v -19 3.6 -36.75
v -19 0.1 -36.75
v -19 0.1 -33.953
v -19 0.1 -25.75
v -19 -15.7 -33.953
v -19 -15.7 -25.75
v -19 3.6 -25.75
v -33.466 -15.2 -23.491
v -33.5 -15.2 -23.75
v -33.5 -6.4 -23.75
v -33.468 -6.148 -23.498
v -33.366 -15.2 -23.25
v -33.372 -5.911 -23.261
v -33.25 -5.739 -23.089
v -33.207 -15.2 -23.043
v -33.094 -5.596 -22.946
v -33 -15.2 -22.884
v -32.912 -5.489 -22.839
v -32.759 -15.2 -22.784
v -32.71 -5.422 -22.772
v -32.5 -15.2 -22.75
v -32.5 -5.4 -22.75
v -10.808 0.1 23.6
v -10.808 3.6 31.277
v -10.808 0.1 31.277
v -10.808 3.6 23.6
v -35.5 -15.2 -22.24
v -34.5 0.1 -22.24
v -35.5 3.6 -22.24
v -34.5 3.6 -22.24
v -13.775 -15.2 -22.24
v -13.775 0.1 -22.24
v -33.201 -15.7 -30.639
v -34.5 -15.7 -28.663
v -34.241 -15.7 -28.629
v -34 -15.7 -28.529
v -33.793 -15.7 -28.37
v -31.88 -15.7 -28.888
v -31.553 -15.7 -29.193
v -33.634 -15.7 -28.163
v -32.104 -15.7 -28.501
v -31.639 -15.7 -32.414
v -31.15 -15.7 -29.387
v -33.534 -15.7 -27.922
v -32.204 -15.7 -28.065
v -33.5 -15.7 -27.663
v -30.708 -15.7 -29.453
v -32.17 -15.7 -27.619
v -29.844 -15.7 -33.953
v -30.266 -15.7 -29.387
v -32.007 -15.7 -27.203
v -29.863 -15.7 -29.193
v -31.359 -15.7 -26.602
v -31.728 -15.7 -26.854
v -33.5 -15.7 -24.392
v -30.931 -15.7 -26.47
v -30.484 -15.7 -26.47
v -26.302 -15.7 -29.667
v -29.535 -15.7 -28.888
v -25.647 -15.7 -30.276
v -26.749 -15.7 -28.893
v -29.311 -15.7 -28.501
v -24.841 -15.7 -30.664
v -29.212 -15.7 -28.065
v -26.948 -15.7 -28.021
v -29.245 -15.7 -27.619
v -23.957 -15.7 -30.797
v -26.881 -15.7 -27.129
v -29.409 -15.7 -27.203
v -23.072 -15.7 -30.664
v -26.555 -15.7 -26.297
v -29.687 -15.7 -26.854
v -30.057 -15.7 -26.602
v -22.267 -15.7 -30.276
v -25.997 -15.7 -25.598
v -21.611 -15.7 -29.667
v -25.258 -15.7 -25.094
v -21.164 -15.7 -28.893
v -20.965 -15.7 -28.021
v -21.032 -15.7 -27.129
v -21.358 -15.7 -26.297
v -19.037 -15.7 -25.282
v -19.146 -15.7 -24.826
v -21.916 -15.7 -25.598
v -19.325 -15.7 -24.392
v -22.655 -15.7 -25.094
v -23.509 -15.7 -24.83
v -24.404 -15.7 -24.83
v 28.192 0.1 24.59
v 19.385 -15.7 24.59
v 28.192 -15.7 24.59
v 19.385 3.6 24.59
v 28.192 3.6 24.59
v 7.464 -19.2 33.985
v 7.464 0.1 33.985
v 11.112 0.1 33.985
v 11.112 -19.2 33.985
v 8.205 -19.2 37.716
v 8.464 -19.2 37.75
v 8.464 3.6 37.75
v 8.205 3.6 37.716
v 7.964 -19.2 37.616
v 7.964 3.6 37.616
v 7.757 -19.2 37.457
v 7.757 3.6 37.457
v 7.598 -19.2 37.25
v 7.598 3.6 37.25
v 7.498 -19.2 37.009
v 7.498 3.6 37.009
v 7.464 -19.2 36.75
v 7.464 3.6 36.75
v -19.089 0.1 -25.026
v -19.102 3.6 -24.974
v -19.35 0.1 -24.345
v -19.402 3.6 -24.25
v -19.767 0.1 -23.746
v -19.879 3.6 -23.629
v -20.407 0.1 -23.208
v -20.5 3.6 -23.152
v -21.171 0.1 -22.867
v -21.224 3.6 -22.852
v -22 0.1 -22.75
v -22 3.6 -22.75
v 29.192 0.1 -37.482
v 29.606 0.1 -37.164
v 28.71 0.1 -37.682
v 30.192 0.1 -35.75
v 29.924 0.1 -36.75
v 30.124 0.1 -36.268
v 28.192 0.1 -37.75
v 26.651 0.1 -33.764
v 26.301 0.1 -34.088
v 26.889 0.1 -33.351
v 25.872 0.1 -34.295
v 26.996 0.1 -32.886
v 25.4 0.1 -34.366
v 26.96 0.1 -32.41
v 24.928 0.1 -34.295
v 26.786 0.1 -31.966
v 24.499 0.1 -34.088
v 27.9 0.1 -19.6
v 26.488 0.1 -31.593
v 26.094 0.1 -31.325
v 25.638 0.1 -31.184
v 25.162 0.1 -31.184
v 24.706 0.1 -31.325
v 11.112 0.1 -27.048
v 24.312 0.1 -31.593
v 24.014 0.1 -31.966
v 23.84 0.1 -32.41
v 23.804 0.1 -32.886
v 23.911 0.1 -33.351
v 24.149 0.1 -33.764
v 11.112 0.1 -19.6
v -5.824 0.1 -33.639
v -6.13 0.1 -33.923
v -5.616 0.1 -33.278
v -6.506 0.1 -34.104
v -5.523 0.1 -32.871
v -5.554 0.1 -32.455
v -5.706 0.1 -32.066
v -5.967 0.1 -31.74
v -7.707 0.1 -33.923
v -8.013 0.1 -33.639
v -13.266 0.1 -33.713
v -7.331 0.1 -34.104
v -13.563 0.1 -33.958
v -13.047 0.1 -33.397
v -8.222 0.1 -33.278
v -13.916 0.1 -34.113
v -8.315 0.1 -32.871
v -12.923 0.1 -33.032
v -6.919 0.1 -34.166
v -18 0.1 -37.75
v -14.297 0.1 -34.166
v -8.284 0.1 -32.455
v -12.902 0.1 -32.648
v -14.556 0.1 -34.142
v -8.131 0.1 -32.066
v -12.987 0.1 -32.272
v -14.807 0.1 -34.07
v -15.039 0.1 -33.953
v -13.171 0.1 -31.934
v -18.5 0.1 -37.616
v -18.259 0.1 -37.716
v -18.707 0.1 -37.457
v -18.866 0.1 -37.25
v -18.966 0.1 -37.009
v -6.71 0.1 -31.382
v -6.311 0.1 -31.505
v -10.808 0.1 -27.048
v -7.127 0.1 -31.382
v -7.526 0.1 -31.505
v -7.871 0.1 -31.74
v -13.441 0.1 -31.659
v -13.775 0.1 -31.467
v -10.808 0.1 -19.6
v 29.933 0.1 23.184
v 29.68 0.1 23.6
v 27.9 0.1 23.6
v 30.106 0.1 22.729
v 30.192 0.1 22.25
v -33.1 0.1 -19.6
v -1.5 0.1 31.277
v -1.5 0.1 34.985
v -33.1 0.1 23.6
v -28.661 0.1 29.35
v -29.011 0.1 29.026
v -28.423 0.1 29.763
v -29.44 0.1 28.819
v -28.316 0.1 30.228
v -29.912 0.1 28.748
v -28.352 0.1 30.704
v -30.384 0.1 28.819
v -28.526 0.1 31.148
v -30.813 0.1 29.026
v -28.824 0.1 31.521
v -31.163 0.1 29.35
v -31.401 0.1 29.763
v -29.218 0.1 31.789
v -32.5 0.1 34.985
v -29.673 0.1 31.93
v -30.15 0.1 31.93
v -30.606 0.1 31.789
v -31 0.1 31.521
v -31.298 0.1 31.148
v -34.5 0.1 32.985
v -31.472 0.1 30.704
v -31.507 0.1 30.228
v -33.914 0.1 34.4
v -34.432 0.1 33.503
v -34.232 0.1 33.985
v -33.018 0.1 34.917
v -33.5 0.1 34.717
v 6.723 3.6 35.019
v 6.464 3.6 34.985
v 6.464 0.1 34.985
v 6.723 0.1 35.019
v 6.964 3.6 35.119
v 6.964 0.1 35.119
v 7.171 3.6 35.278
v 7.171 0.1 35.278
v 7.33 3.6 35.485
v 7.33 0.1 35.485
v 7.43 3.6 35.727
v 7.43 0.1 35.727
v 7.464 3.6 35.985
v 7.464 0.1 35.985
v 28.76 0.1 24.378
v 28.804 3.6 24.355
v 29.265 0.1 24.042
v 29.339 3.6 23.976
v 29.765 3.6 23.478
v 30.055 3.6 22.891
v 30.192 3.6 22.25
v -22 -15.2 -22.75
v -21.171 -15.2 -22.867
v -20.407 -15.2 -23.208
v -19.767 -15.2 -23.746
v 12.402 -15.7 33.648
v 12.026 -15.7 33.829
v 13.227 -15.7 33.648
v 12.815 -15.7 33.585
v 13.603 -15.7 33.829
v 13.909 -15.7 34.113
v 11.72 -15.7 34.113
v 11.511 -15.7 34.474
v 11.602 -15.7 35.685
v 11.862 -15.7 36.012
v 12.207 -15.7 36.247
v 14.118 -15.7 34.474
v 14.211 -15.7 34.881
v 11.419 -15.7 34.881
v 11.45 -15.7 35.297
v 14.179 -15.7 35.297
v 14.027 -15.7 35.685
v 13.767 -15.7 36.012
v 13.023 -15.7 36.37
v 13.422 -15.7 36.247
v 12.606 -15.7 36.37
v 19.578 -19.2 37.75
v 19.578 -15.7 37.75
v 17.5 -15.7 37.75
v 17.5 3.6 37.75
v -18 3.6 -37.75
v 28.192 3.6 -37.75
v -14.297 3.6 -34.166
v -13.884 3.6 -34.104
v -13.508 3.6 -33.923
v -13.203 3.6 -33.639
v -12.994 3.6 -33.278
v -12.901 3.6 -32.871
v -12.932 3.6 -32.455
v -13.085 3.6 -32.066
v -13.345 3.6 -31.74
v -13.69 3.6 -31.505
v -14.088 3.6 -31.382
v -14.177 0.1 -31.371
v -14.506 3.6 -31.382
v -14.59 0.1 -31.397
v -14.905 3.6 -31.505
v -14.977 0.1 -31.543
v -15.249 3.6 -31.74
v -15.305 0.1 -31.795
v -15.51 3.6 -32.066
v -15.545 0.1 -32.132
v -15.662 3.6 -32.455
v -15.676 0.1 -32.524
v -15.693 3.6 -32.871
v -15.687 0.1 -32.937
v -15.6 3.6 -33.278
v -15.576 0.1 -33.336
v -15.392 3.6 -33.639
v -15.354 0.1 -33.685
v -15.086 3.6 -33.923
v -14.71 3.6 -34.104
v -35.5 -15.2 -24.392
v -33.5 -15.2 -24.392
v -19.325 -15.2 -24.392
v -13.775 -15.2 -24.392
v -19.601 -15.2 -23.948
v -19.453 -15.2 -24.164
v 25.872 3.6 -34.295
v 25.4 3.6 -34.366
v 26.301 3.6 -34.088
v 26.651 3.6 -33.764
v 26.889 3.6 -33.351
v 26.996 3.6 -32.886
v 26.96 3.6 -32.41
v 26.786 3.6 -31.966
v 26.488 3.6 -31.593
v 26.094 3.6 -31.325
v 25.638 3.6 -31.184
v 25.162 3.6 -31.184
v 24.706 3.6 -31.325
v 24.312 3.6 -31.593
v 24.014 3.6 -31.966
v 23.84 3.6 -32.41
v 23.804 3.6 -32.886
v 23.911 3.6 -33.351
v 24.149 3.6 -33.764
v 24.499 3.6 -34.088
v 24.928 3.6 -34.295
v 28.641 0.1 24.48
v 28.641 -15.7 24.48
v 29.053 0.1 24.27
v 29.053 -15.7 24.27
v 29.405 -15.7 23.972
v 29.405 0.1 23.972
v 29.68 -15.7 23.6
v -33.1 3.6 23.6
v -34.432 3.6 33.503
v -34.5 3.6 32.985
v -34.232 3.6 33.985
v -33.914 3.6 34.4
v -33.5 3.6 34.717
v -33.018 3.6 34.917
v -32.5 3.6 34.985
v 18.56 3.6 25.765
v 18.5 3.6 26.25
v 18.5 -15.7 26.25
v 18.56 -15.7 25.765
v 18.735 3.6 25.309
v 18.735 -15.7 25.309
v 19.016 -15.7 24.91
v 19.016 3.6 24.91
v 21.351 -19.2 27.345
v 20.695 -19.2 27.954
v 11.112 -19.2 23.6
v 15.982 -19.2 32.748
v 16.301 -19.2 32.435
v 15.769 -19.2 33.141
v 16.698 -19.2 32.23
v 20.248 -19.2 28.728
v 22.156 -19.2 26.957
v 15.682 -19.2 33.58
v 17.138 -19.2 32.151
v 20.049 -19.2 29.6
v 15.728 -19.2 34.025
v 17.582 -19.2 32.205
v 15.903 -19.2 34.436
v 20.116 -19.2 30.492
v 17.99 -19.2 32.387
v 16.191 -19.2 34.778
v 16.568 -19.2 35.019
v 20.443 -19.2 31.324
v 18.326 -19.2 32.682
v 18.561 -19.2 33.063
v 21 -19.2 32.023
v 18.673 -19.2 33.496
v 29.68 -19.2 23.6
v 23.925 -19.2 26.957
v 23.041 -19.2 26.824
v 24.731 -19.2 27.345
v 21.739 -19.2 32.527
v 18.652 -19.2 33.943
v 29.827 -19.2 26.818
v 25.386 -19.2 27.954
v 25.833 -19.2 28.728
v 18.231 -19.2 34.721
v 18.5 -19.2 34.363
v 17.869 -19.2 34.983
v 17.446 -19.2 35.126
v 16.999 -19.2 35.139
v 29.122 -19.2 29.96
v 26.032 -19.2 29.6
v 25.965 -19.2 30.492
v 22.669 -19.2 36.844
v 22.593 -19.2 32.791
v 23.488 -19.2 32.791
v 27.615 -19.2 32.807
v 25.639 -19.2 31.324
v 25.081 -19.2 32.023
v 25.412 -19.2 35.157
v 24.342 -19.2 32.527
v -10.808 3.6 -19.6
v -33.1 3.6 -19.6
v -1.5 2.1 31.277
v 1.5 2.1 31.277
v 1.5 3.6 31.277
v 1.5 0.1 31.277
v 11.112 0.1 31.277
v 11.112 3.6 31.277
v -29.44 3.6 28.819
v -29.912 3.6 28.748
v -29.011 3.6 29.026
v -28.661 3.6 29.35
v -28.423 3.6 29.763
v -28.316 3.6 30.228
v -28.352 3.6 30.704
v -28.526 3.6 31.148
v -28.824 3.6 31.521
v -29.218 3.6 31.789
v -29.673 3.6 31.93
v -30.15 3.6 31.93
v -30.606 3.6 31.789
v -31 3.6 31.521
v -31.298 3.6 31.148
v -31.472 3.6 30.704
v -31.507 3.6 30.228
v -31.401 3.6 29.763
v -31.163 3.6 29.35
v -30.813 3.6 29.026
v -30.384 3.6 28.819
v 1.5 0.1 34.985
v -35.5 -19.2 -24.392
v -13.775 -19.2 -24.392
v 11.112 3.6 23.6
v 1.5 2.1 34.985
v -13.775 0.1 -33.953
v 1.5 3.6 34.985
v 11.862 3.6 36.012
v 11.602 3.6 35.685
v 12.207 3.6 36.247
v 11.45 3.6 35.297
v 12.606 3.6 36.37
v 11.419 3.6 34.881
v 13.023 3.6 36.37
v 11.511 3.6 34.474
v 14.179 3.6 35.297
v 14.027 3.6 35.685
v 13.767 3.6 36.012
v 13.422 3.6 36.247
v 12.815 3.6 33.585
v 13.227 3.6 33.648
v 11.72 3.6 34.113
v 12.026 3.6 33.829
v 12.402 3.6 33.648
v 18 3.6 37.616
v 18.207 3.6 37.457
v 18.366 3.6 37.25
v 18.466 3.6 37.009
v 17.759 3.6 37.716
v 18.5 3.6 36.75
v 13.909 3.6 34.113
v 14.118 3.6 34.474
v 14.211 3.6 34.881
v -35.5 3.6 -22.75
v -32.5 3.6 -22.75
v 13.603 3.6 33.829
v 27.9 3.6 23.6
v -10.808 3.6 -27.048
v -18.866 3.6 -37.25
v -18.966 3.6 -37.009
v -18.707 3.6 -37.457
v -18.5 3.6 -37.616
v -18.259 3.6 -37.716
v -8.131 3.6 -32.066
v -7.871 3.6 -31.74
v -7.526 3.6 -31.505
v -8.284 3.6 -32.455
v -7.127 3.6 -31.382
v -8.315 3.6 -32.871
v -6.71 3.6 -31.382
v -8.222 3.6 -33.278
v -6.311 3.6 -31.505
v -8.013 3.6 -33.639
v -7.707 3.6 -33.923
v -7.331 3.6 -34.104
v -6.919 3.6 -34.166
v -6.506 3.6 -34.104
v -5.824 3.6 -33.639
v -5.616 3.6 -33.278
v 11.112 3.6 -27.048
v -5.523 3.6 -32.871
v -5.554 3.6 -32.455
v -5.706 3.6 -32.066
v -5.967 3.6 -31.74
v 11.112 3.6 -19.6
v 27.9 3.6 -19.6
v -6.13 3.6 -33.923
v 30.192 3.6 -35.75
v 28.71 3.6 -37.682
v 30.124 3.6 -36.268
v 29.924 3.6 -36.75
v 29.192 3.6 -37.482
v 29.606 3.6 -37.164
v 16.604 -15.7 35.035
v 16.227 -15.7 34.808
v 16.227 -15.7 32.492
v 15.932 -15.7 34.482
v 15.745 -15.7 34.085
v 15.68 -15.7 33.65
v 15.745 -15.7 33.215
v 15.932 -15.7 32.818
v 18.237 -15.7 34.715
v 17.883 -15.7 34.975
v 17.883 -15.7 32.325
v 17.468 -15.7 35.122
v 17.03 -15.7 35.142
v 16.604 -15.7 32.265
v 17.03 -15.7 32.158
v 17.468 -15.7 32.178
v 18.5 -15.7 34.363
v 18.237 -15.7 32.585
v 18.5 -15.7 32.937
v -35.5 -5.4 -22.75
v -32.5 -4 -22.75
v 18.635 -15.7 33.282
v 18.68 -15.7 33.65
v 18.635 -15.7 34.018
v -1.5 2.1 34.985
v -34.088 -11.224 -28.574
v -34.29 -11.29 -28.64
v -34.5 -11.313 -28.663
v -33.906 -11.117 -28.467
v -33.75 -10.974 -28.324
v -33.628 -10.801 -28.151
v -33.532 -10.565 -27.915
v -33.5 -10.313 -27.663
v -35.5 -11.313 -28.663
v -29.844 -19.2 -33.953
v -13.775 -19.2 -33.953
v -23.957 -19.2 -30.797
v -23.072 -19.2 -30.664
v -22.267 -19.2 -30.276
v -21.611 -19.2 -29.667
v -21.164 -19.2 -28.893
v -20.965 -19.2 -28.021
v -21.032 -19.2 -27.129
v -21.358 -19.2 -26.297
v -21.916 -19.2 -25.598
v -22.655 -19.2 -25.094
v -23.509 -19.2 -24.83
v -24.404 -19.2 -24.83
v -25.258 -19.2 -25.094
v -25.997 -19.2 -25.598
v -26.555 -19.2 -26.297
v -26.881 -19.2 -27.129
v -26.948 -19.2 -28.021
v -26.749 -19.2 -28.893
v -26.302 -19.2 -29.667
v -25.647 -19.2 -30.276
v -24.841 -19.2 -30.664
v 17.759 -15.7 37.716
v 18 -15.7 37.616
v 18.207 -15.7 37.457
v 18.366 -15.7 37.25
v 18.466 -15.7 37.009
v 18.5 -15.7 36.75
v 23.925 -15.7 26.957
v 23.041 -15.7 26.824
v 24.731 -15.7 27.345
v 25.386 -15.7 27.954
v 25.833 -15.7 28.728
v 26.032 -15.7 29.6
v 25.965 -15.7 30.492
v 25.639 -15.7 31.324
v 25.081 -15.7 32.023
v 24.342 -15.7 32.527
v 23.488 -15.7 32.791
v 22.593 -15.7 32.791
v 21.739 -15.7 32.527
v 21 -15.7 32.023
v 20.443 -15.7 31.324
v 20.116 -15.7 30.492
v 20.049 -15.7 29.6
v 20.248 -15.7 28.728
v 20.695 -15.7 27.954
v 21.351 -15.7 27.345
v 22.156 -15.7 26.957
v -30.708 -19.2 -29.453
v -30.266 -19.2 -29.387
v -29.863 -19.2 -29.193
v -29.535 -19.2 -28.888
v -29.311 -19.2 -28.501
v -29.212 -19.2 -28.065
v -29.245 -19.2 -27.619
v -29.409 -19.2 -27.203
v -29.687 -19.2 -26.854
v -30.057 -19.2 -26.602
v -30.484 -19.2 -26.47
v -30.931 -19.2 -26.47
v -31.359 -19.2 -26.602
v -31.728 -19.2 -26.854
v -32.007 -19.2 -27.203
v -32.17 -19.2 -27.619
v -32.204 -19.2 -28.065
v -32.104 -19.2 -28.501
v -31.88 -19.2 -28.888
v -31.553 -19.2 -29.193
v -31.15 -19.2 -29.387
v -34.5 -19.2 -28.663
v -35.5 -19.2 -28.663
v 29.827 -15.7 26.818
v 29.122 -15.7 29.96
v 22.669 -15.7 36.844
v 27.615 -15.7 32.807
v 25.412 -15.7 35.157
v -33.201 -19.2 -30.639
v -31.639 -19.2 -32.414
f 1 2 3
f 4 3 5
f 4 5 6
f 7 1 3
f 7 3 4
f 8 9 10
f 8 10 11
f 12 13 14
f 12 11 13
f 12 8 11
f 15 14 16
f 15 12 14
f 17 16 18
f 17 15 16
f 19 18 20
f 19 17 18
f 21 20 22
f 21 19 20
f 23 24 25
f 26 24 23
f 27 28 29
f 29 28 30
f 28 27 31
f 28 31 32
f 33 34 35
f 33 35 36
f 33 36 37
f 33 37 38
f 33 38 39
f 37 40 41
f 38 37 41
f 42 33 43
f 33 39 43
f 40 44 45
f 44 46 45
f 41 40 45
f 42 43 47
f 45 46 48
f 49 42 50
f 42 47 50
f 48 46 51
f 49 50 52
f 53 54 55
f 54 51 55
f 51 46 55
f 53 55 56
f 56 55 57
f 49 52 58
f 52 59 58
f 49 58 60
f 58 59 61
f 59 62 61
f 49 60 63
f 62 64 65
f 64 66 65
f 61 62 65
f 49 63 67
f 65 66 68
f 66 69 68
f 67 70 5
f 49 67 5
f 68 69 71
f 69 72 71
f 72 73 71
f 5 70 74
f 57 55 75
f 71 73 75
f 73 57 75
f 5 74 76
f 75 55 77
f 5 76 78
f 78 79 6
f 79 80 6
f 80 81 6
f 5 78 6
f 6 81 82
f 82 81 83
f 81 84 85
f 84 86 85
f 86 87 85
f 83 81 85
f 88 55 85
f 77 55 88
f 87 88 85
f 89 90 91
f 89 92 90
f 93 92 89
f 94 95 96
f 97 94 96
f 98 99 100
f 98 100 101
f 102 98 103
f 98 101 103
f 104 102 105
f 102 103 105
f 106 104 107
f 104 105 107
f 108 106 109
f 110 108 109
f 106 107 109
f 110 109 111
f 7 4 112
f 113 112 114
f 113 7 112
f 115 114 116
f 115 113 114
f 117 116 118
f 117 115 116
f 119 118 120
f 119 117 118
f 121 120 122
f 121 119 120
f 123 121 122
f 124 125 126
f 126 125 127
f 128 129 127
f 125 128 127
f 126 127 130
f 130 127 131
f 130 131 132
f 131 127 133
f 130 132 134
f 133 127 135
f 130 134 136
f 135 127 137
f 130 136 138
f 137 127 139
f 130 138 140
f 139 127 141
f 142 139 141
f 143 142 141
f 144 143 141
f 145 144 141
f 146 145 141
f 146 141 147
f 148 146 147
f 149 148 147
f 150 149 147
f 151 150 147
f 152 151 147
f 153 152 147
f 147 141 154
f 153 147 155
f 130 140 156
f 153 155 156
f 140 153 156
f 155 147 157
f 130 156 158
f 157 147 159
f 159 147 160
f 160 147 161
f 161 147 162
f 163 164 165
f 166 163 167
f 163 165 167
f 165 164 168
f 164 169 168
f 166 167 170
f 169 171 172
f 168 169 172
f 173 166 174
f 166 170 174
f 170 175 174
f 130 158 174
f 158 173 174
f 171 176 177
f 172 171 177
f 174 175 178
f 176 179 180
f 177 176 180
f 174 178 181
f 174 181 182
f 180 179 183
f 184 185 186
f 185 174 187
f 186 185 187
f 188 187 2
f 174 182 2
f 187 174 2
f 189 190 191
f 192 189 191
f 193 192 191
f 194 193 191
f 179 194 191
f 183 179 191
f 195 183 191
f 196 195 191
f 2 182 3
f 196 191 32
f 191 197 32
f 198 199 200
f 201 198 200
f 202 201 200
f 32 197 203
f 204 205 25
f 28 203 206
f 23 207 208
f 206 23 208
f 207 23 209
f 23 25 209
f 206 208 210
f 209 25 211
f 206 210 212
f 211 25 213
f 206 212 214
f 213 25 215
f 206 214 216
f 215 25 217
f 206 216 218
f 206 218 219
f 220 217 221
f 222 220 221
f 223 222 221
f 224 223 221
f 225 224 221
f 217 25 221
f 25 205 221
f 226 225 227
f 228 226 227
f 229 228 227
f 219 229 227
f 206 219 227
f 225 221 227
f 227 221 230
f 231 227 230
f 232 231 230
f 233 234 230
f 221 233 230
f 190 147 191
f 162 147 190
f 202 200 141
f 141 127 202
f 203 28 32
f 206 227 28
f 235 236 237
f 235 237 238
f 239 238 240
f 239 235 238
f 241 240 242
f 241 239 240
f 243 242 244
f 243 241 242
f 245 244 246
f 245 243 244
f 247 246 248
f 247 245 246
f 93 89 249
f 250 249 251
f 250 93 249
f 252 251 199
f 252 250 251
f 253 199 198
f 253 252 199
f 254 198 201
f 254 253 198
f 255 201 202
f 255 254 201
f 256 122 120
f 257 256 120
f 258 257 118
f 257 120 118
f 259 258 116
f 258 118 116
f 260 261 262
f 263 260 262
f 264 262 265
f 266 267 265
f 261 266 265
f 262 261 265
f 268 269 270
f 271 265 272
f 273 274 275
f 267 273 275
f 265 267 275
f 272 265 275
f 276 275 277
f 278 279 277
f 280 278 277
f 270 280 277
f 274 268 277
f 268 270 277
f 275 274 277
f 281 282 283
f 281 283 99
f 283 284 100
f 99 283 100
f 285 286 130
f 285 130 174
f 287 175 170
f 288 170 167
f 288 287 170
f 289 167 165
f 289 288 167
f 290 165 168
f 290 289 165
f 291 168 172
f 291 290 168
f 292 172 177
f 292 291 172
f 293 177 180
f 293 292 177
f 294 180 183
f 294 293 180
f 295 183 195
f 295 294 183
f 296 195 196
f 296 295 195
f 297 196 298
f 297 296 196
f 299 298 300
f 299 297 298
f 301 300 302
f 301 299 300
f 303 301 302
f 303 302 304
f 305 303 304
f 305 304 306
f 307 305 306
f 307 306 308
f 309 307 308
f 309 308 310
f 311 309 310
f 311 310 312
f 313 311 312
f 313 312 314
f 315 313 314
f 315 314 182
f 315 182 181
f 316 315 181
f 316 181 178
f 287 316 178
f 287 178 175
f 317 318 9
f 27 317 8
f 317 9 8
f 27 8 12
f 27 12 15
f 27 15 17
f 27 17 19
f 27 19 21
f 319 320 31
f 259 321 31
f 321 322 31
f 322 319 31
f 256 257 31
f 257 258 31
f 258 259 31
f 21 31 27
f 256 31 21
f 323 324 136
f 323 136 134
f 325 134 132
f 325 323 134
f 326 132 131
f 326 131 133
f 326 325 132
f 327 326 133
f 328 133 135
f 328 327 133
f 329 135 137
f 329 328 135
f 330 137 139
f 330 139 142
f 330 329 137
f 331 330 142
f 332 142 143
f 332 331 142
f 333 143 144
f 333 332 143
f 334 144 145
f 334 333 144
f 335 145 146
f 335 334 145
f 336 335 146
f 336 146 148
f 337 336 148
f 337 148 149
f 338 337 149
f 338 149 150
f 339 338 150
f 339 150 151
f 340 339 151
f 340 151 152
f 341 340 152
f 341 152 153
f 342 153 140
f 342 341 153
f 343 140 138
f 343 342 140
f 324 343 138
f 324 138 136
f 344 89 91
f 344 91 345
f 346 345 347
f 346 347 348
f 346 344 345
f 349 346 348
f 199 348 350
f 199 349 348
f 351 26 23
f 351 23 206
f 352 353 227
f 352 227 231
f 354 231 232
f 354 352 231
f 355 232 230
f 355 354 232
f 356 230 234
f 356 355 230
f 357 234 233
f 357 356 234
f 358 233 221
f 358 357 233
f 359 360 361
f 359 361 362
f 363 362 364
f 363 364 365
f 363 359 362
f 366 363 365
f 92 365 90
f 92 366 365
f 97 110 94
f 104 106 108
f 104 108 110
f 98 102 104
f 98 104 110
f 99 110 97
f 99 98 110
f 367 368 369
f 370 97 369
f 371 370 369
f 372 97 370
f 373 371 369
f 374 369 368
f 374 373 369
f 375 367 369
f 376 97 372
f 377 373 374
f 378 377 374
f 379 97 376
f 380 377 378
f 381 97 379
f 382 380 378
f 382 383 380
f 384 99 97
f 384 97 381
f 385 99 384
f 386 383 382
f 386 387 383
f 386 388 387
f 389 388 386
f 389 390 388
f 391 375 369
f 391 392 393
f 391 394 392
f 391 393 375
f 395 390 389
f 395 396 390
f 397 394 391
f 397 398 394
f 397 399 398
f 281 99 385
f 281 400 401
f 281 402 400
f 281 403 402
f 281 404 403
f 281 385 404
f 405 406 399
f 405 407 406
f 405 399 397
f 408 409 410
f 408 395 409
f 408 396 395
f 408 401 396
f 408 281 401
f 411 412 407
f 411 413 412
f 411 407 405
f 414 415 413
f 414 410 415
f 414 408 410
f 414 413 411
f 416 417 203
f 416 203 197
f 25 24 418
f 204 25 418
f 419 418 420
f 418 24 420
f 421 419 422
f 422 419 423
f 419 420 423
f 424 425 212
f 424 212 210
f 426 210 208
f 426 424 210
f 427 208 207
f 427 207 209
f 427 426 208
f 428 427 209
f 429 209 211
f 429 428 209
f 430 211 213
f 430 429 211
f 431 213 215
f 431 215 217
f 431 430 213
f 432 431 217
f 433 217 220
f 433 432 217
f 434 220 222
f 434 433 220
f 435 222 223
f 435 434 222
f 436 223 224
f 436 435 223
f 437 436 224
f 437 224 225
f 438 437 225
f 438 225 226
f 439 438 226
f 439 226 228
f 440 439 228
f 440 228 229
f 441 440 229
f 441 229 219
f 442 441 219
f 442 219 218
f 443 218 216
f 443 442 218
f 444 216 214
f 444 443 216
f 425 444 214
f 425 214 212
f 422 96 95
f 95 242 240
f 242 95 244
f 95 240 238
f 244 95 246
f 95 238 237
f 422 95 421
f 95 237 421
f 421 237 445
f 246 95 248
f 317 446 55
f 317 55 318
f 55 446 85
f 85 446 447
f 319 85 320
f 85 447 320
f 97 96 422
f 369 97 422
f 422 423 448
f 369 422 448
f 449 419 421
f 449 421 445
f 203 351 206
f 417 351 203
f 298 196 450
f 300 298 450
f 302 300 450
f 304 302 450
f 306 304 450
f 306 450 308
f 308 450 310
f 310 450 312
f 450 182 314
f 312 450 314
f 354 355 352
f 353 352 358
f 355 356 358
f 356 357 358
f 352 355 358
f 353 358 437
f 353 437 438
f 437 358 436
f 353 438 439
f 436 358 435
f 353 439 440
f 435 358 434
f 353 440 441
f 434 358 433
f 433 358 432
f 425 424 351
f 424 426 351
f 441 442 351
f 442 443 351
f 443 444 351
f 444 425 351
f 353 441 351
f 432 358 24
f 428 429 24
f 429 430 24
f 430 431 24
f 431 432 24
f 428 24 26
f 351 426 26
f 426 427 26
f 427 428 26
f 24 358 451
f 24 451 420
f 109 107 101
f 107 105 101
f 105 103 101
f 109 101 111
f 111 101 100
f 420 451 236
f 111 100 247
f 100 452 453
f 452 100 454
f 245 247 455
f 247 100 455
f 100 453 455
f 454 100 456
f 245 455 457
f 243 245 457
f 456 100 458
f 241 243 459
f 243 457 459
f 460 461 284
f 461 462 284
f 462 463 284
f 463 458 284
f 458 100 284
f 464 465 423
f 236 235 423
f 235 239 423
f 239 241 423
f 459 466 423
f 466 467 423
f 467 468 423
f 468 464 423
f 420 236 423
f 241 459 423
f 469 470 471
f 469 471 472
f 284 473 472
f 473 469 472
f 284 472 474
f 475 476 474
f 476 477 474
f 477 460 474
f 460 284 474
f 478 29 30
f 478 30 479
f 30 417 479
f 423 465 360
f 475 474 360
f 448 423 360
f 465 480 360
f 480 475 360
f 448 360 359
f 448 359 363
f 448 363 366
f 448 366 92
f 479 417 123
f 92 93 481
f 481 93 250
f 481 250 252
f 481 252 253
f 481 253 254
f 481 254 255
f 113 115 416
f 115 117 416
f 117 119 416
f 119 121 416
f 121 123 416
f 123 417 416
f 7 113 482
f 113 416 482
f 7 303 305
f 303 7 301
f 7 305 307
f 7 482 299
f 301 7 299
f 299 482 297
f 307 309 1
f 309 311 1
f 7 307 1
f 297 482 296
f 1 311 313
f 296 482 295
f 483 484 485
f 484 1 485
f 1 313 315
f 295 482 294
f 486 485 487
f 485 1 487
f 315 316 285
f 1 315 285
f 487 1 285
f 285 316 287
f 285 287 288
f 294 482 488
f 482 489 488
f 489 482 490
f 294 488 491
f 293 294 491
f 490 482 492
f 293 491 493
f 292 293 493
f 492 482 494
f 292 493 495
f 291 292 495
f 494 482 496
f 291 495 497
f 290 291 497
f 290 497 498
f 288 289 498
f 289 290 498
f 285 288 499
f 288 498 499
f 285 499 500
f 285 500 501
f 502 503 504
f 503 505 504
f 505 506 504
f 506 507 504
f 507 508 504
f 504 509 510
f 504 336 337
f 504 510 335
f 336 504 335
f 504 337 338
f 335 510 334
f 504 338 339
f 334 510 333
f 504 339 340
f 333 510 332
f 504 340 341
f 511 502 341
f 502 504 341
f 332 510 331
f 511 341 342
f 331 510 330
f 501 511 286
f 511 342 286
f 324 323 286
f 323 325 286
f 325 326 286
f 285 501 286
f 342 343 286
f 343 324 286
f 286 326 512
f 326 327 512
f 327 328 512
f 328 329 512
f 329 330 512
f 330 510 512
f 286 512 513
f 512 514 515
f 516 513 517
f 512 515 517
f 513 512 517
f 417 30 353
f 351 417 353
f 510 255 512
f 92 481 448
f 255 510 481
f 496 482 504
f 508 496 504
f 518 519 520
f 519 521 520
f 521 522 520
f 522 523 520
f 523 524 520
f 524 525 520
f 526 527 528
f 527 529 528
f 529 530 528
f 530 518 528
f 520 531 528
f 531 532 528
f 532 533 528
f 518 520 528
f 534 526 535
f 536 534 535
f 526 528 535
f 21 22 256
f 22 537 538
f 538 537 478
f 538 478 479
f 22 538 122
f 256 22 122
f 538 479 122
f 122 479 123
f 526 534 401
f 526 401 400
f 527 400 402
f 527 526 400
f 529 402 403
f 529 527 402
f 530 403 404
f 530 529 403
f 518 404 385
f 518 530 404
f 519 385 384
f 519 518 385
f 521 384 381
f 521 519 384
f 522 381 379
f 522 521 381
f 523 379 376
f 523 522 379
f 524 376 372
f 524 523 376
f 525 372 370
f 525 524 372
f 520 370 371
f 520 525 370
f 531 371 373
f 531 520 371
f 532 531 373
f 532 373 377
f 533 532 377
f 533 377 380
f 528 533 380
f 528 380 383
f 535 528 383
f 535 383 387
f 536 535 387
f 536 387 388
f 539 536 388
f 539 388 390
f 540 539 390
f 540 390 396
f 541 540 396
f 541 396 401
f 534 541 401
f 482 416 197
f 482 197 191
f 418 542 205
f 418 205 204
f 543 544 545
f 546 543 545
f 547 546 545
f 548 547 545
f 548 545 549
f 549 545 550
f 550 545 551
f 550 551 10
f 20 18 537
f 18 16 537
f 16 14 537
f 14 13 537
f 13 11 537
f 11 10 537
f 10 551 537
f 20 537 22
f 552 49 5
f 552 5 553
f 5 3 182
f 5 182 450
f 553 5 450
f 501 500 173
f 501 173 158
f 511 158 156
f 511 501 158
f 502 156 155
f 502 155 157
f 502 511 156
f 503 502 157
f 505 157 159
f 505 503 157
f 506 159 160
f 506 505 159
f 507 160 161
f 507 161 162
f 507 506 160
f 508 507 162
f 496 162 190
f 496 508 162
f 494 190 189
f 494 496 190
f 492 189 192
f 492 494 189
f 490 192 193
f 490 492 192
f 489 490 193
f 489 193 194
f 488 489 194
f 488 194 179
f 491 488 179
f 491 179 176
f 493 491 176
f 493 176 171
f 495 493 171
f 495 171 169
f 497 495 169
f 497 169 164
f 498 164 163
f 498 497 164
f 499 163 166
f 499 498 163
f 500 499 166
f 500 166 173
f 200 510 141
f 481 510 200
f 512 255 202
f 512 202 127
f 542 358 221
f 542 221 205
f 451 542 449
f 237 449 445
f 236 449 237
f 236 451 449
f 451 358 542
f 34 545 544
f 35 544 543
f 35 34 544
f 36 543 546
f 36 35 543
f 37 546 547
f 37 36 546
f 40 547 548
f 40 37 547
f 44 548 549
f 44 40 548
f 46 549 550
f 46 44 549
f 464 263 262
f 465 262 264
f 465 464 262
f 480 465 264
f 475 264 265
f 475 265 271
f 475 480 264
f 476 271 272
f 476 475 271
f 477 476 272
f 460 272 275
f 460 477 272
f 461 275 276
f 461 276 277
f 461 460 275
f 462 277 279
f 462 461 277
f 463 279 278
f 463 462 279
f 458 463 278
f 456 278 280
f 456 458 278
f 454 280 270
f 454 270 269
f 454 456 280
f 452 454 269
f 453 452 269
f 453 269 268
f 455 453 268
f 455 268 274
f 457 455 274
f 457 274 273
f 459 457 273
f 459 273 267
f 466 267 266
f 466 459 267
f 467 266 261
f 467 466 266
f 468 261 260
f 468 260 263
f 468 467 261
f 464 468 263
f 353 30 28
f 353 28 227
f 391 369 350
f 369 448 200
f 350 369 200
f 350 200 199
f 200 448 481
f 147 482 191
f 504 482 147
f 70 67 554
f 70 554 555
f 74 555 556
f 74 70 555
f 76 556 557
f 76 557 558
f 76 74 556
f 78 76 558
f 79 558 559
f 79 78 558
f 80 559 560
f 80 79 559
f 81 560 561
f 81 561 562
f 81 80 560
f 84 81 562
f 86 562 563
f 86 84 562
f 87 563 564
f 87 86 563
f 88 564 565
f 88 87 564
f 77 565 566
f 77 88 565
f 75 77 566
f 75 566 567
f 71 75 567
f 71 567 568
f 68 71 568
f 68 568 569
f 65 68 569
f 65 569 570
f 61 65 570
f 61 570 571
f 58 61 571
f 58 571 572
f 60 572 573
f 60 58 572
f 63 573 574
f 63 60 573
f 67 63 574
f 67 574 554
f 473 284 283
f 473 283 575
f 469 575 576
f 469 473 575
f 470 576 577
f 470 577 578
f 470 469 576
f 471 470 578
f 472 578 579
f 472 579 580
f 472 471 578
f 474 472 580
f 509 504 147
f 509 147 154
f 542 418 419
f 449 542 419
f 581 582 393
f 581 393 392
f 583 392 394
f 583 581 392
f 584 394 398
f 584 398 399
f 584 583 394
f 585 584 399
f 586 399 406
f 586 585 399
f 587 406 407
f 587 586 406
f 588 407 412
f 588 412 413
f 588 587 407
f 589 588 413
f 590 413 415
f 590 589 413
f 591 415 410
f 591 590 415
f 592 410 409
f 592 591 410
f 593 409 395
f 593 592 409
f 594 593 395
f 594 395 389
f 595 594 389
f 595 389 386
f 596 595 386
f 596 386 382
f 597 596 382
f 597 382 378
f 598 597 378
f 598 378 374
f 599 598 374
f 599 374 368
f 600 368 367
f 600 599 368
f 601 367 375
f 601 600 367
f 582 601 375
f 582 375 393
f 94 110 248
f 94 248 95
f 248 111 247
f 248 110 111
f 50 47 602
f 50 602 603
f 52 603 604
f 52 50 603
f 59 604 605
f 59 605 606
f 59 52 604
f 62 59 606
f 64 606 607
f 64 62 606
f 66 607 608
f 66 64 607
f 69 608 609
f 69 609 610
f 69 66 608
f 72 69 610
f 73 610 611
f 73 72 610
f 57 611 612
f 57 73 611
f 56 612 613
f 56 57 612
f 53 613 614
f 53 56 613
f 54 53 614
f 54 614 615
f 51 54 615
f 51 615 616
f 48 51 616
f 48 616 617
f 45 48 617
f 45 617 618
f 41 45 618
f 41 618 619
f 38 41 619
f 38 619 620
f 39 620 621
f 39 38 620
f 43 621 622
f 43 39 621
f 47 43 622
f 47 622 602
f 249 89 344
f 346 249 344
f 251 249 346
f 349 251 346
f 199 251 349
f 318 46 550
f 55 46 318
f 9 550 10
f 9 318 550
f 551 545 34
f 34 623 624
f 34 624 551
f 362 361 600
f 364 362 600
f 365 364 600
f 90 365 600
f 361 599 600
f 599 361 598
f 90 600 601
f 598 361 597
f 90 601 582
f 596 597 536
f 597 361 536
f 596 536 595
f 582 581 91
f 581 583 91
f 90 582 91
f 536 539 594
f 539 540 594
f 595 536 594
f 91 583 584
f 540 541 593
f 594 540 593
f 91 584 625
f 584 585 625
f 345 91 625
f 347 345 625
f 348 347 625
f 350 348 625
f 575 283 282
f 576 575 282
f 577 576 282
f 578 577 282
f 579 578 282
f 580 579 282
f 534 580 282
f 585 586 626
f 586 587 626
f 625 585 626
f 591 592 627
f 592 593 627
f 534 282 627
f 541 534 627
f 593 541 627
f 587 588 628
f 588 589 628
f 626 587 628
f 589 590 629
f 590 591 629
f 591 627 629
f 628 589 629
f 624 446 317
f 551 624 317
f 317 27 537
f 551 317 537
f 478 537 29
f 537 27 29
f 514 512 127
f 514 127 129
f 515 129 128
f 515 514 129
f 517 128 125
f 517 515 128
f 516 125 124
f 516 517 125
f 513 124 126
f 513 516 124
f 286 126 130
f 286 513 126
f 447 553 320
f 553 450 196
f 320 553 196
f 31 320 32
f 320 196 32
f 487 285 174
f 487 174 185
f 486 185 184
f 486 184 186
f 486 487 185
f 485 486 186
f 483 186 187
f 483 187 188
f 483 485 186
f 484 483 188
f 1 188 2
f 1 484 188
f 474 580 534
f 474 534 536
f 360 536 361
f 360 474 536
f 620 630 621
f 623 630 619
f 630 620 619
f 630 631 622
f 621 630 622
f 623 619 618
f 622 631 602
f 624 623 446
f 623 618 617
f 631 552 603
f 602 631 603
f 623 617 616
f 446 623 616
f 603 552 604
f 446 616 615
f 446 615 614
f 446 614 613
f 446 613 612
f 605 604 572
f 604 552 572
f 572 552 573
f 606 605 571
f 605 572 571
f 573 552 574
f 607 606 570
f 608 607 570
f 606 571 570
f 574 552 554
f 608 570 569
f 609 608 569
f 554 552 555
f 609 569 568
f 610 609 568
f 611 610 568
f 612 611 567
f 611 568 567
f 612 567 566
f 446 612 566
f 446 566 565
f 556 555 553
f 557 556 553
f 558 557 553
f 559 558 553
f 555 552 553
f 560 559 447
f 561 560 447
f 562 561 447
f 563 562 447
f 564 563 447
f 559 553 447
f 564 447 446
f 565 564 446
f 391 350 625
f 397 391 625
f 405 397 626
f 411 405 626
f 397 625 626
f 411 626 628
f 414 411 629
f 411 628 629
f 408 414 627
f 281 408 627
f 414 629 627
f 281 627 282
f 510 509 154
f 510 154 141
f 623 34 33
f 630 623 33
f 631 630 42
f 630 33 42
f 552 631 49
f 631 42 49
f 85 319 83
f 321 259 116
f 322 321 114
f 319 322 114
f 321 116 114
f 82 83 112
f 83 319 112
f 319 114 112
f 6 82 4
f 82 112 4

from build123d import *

# Parameters (mm, degrees)
SKETCH2_R           = 1.4
SKETCH2_R_2         = 1.6
BOSS_EXTRUDE1_DEPTH = 3.5
SKETCH3_R           = 1.4
BOSS_EXTRUDE2_DEPTH = 15.8
SKETCH4_R           = 3
SKETCH4_R_2         = 1.5
BOSS_EXTRUDE3_DEPTH = 3.5
SKETCH5_W           = 3
SKETCH5_H           = 3.708496363
BOSS_EXTRUDE4_DEPTH = 1.5
SKETCH7_W           = 35.498397003
SKETCH7_H           = 12.144188448
CUT_EXTRUDE2_DEPTH  = 4
BOSS_EXTRUDE5_DEPTH = 1
SKETCH6_W           = 15.172785082
SKETCH6_H           = 14.006435155
CUT_EXTRUDE3_DEPTH  = 15
CHAMFER1_START      = -11.4
CHAMFER1_DEPTH      = 0.087265638
CHAMFER1_START_2    = -35.5
CHAMFER1_2_DEPTH    = 3
CHAMFER1_START_3    = -11.312734362
CHAMFER1_3_DEPTH    = 7.312734362


with BuildPart() as part:
    # Sketch2 → Boss-Extrude1 (new body)
    with BuildSketch(Plane.XZ.offset(-3.6)):
        with BuildLine():
            Line((11.111566046, -27.048023457), (11.111566046, -19.6))
            Line((11.111566046, -19.6), (27.9, -19.6))
            Line((27.9, -19.6), (27.9, 23.6))
            Line((27.9, 23.6), (11.111563156, 23.6))
            Line((11.111563156, 23.6), (11.111563156, 31.276925258))
            Line((11.111563156, 31.276925258), (1.5, 31.276925258))
            Line((1.5, 31.276925258), (1.5, 34.985421621))
            Line((1.5, 34.985421621), (6.463917188, 34.985421621))
            ThreePointArc((6.463917188, 34.985421621), (7.171023969, 35.278314839), (7.463917188, 35.985421621))
            Line((7.463917188, 35.985421621), (7.463917188, 36.75))
            ThreePointArc((7.463917188, 36.75), (7.756810407, 37.457106781), (8.463917188, 37.75))
            Line((8.463917188, 37.75), (17.5, 37.75))
            ThreePointArc((17.5, 37.75), (18.207106781, 37.457106781), (18.5, 36.75))
            Line((18.5, 36.75), (18.5, 26.25))
            ThreePointArc((18.5, 26.25), (18.73500033, 25.309374588), (19.384776166, 24.589796458))
            Line((19.384776166, 24.589796458), (28.192260407, 24.589796458))
            ThreePointArc((28.192260407, 24.589796458), (29.567455824, 23.740606822), (30.192257213, 22.25))
            Line((30.192257213, 22.25), (30.192257213, -35.750098385))
            ThreePointArc((30.192257213, -35.750098385), (29.606435992, -37.164248347), (28.192257213, -37.75))
            Line((28.192257213, -37.75), (-18, -37.75))
            ThreePointArc((-18, -37.75), (-18.707106781, -37.457106781), (-19, -36.75))
            Line((-19, -36.75), (-19, -25.75))
            ThreePointArc((-19, -25.75), (-19.878679656, -23.628679656), (-22, -22.75))
            Line((-22, -22.75), (-32.5, -22.75))
            ThreePointArc((-32.5, -22.75), (-33.207106781, -23.042893219), (-33.5, -23.75))
            Line((-33.5, -23.75), (-33.5, -27.662734362))
            ThreePointArc((-33.5, -27.662734362), (-33.792893219, -28.369841143), (-34.5, -28.662734362))
            Line((-34.5, -28.662734362), (-34.5, 32.985421621))
            ThreePointArc((-34.5, 32.985421621), (-33.914213562, 34.399635183), (-32.5, 34.985421621))
            Line((-32.5, 34.985421621), (-1.5, 34.985421621))
            Line((-1.5, 34.985421621), (-1.5, 31.276925258))
            Line((-1.5, 31.276925258), (-10.808436895, 31.276925258))
            Line((-10.808436895, 31.276925258), (-10.808436895, 23.6))
            Line((-10.808436895, 23.6), (-33.1, 23.6))
            Line((-33.1, 23.6), (-33.1, -19.6))
            Line((-33.1, -19.6), (-10.808436895, -19.6))
            Line((-10.808436895, -19.6), (-10.808436895, -27.048023457))
            Line((-10.808436895, -27.048023457), (11.111566046, -27.048023457))
        make_face()
        with Locations(Location((-6.918752516, -32.76626587, 0), (0, 0, 270))):
            Circle(SKETCH2_R, mode=Mode.SUBTRACT)
        with Locations(Location((25.4, -32.76626587, 0), (0, 0, 270))):
            Circle(SKETCH2_R_2, mode=Mode.SUBTRACT)
        with Locations(Location((-14.297096298, -32.76626587, 0), (0, 0, 270))):
            Circle(SKETCH2_R, mode=Mode.SUBTRACT)
        with Locations(Location((-29.911917882, 30.347920192, 0), (0, 0, 270))):
            Circle(SKETCH2_R_2, mode=Mode.SUBTRACT)
        with Locations(Location((12.814585658, 34.985421621, 0), (0, 0, 270))):
            Circle(SKETCH2_R, mode=Mode.SUBTRACT)
    extrude(amount=BOSS_EXTRUDE1_DEPTH)

    # Sketch3 → Boss-Extrude2 (add)
    # profile 1 of 2: a face of its own
    with BuildSketch(Plane(origin=(0, 0.1, 0), x_dir=(-1, 0, 0), z_dir=(0, -1, 0))):
        with BuildLine():
            Line((-7.463917188, -33.985421621), (-7.463917188, -36.75))
            ThreePointArc((-7.463917188, -36.75), (-7.756810407, -37.457106781), (-8.463917188, -37.75))
            Line((-8.463917188, -37.75), (-17.5, -37.75))
            ThreePointArc((-17.5, -37.75), (-18.207106781, -37.457106781), (-18.5, -36.75))
            Line((-18.5, -36.75), (-18.5, -26.25))
            ThreePointArc((-18.5, -26.25), (-18.73500033, -25.309374588), (-19.384776166, -24.589796458))
            Line((-19.384776166, -24.589796458), (-28.192260407, -24.589796458))
            ThreePointArc((-28.192260407, -24.589796458), (-29.052595302, -24.270206108), (-29.679602398, -23.6))
            Line((-29.679602398, -23.6), (-11.111563156, -23.6))
            Line((-11.111563156, -23.6), (-11.111563156, -24.25))
            Line((-11.111563156, -24.25), (-11.111563156, -33.985421621))
            Line((-11.111563156, -33.985421621), (-7.463917188, -33.985421621))
        make_face()
        with Locations(Location((-12.814585658, -34.985421621, 0), (0, 0, 90))):
            Circle(SKETCH3_R, mode=Mode.SUBTRACT)
    # profile 2 of 2: a face of its own
    with BuildSketch(Plane(origin=(0, 0.1, 0), x_dir=(-1, 0, 0), z_dir=(0, -1, 0))):
        with BuildLine():
            Line((13.774855788, 22.239537014), (34.5, 22.239537014))
            Line((34.5, 22.239537014), (34.5, 23.75))
            Line((34.5, 23.75), (34.5, 28.662734362))
            ThreePointArc((34.5, 28.662734362), (33.792893219, 28.369841143), (33.5, 27.662734362))
            Line((33.5, 27.662734362), (33.5, 23.75))
            ThreePointArc((33.5, 23.75), (33.207106781, 23.042893219), (32.5, 22.75))
            Line((32.5, 22.75), (22, 22.75))
            ThreePointArc((22, 22.75), (20.777489524, 23.010389054), (19.767197945, 23.746354576))
            ThreePointArc((19.767197945, 23.746354576), (19.198357074, 24.67724797), (19, 25.75))
            Line((19, 25.75), (19, 33.953406826))
            Line((19, 33.953406826), (13.774855788, 33.953406826))
            Line((13.774855788, 33.953406826), (13.774855788, 31.467318277))
            Line((13.774855788, 31.467318277), (13.774855788, 23.746354576))
            Line((13.774855788, 23.746354576), (13.774855788, 22.239537014))
        make_face()
    extrude(amount=BOSS_EXTRUDE2_DEPTH)

    # Sketch4 → Boss-Extrude3 (add)
    # profile 1 of 2: a face of its own
    with BuildSketch(Plane.XZ.offset(15.7)):
        with BuildLine():
            Line((11.111563156, 23.6), (29.679602398, 23.6))
            ThreePointArc((29.679602398, 23.6), (27.614927524, 32.806940788), (19.577713664, 37.75))
            Line((19.577713664, 37.75), (8.463917188, 37.75))
            ThreePointArc((8.463917188, 37.75), (7.756810407, 37.457106781), (7.463917188, 36.75))
            Line((7.463917188, 36.75), (7.463917188, 33.985421621))
            Line((7.463917188, 33.985421621), (11.111563156, 33.985421621))
            Line((11.111563156, 33.985421621), (11.111563156, 23.6))
        make_face()
        with Locations(Location((23.040610867, 29.824211278, 0), (0, 0, 270))):
            Circle(SKETCH4_R, mode=Mode.SUBTRACT)
        with Locations(Location((17.180435895, 33.650043419, 0), (0, 0, 28.392671192))):
            Circle(SKETCH4_R_2, mode=Mode.SUBTRACT)
    # profile 2 of 2: a face of its own
    with BuildSketch(Plane.XZ.offset(15.7)):
        with BuildLine():
            Line((-29.84427835, -33.953406826), (-13.774855788, -33.953406826))
            Line((-13.774855788, -33.953406826), (-13.774855788, -22.239537014))
            Line((-13.774855788, -22.239537014), (-34.5, -22.239537014))
            Line((-34.5, -22.239537014), (-34.5, -28.662734362))
            ThreePointArc((-34.5, -28.662734362), (-32.451529424, -31.553930311), (-29.84427835, -33.953406826))
        make_face()
        with Locations(Location((-23.956564477, -27.796810843, 0), (0, 0, 270))):
            Circle(SKETCH4_R, mode=Mode.SUBTRACT)
        with Locations(Location((-30.707720306, -27.953239531, 0), (0, 0, 270))):
            Circle(SKETCH4_R_2, mode=Mode.SUBTRACT)
    extrude(amount=BOSS_EXTRUDE3_DEPTH)

    # Sketch5 → Boss-Extrude4 (add)
    with BuildSketch(Plane(origin=(0, 3.6, 0), x_dir=(1, 0, 0), z_dir=(0, 1, 0))):
        with Locations((0, -33.13117344)):
            Rectangle(SKETCH5_W, SKETCH5_H)
    extrude(amount=-BOSS_EXTRUDE4_DEPTH)

    # Sketch7 → Cut-Extrude2 (cut)
    with BuildSketch(Plane.XZ.offset(19.2)):
        with Locations((-20.871227876, -18.320079155)):
            Rectangle(SKETCH7_W, SKETCH7_H)
    extrude(amount=-CUT_EXTRUDE2_DEPTH, mode=Mode.SUBTRACT)

    # Sketch8 → Boss-Extrude5 (add)
    with BuildSketch(Plane.ZY.offset(34.5)):
        Polygon((-24.392173379, -19.2), (-24.392173379, -15.2), (-22.239537014, -15.2), (-22.239537014, 0.1), (-22.239537014, 3.6), (-28.662734362, 3.6), (-28.662734362, -19.2), align=None)
    extrude(amount=BOSS_EXTRUDE5_DEPTH)

    # Sketch6 → Cut-Extrude3 (cut)
    with BuildSketch(Plane(origin=(0, 3.6, 0), x_dir=(1, 0, 0), z_dir=(0, 1, 0))):
        with Locations((-37.568827946, 29.753217578)):
            Rectangle(SKETCH6_W, SKETCH6_H)
    extrude(amount=-CUT_EXTRUDE3_DEPTH, mode=Mode.SUBTRACT)

    # Chamfer1: read off the stored shape, not the designer's step
    # Chamfer1 outline → Chamfer1 (add)
    with BuildSketch(Plane(origin=(0, 0, 0), x_dir=(1, 0, 0), z_dir=(0, 1, 0)).offset(CHAMFER1_START)):
        with BuildLine():
            Line((-33.5, 23.75), (-33.5, 27.662734362))
            ThreePointArc((-33.5, 27.662734362), (-33.792893219, 28.369841143), (-34.5, 28.662734362))
            Line((-34.5, 28.662734362), (-35.5, 28.662734362))
            Line((-35.5, 28.662734362), (-35.5, 22.75))
            Line((-35.5, 22.75), (-32.5, 22.75))
            ThreePointArc((-32.5, 22.75), (-33.207106781, 23.042893219), (-33.5, 23.75))
        make_face()
    extrude(amount=CHAMFER1_DEPTH)

    # Chamfer1 2 outline → Chamfer1 2 (add)
    with BuildSketch(Plane.YZ.offset(CHAMFER1_START_2)):
        Polygon((-11.312734362, -28.662734362), (-5.4, -22.75), (-11.312734362, -22.75), align=None)
    extrude(amount=CHAMFER1_2_DEPTH)

    # Chamfer1 3 outline → Chamfer1 3 (cut)
    with BuildSketch(Plane(origin=(0, 0, 0), x_dir=(1, 0, 0), z_dir=(0, 1, 0)).offset(CHAMFER1_START_3)):
        with BuildLine():
            ThreePointArc((-34.5, 28.662734362), (-33.792893219, 28.369841143), (-33.5, 27.662734362))
            Line((-33.5, 27.662734362), (-33.5, 23.75))
            ThreePointArc((-33.5, 23.75), (-33.207106781, 23.042893219), (-32.5, 22.75))
            Line((-32.5, 22.75), (-32.5, 30))
            Line((-32.5, 30), (-36, 30))
            Line((-36, 30), (-36, 28.662734363))
            Line((-36, 28.662734363), (-34.5, 28.662734362))
        make_face()
    extrude(amount=CHAMFER1_3_DEPTH, mode=Mode.SUBTRACT)


solid = part.part
